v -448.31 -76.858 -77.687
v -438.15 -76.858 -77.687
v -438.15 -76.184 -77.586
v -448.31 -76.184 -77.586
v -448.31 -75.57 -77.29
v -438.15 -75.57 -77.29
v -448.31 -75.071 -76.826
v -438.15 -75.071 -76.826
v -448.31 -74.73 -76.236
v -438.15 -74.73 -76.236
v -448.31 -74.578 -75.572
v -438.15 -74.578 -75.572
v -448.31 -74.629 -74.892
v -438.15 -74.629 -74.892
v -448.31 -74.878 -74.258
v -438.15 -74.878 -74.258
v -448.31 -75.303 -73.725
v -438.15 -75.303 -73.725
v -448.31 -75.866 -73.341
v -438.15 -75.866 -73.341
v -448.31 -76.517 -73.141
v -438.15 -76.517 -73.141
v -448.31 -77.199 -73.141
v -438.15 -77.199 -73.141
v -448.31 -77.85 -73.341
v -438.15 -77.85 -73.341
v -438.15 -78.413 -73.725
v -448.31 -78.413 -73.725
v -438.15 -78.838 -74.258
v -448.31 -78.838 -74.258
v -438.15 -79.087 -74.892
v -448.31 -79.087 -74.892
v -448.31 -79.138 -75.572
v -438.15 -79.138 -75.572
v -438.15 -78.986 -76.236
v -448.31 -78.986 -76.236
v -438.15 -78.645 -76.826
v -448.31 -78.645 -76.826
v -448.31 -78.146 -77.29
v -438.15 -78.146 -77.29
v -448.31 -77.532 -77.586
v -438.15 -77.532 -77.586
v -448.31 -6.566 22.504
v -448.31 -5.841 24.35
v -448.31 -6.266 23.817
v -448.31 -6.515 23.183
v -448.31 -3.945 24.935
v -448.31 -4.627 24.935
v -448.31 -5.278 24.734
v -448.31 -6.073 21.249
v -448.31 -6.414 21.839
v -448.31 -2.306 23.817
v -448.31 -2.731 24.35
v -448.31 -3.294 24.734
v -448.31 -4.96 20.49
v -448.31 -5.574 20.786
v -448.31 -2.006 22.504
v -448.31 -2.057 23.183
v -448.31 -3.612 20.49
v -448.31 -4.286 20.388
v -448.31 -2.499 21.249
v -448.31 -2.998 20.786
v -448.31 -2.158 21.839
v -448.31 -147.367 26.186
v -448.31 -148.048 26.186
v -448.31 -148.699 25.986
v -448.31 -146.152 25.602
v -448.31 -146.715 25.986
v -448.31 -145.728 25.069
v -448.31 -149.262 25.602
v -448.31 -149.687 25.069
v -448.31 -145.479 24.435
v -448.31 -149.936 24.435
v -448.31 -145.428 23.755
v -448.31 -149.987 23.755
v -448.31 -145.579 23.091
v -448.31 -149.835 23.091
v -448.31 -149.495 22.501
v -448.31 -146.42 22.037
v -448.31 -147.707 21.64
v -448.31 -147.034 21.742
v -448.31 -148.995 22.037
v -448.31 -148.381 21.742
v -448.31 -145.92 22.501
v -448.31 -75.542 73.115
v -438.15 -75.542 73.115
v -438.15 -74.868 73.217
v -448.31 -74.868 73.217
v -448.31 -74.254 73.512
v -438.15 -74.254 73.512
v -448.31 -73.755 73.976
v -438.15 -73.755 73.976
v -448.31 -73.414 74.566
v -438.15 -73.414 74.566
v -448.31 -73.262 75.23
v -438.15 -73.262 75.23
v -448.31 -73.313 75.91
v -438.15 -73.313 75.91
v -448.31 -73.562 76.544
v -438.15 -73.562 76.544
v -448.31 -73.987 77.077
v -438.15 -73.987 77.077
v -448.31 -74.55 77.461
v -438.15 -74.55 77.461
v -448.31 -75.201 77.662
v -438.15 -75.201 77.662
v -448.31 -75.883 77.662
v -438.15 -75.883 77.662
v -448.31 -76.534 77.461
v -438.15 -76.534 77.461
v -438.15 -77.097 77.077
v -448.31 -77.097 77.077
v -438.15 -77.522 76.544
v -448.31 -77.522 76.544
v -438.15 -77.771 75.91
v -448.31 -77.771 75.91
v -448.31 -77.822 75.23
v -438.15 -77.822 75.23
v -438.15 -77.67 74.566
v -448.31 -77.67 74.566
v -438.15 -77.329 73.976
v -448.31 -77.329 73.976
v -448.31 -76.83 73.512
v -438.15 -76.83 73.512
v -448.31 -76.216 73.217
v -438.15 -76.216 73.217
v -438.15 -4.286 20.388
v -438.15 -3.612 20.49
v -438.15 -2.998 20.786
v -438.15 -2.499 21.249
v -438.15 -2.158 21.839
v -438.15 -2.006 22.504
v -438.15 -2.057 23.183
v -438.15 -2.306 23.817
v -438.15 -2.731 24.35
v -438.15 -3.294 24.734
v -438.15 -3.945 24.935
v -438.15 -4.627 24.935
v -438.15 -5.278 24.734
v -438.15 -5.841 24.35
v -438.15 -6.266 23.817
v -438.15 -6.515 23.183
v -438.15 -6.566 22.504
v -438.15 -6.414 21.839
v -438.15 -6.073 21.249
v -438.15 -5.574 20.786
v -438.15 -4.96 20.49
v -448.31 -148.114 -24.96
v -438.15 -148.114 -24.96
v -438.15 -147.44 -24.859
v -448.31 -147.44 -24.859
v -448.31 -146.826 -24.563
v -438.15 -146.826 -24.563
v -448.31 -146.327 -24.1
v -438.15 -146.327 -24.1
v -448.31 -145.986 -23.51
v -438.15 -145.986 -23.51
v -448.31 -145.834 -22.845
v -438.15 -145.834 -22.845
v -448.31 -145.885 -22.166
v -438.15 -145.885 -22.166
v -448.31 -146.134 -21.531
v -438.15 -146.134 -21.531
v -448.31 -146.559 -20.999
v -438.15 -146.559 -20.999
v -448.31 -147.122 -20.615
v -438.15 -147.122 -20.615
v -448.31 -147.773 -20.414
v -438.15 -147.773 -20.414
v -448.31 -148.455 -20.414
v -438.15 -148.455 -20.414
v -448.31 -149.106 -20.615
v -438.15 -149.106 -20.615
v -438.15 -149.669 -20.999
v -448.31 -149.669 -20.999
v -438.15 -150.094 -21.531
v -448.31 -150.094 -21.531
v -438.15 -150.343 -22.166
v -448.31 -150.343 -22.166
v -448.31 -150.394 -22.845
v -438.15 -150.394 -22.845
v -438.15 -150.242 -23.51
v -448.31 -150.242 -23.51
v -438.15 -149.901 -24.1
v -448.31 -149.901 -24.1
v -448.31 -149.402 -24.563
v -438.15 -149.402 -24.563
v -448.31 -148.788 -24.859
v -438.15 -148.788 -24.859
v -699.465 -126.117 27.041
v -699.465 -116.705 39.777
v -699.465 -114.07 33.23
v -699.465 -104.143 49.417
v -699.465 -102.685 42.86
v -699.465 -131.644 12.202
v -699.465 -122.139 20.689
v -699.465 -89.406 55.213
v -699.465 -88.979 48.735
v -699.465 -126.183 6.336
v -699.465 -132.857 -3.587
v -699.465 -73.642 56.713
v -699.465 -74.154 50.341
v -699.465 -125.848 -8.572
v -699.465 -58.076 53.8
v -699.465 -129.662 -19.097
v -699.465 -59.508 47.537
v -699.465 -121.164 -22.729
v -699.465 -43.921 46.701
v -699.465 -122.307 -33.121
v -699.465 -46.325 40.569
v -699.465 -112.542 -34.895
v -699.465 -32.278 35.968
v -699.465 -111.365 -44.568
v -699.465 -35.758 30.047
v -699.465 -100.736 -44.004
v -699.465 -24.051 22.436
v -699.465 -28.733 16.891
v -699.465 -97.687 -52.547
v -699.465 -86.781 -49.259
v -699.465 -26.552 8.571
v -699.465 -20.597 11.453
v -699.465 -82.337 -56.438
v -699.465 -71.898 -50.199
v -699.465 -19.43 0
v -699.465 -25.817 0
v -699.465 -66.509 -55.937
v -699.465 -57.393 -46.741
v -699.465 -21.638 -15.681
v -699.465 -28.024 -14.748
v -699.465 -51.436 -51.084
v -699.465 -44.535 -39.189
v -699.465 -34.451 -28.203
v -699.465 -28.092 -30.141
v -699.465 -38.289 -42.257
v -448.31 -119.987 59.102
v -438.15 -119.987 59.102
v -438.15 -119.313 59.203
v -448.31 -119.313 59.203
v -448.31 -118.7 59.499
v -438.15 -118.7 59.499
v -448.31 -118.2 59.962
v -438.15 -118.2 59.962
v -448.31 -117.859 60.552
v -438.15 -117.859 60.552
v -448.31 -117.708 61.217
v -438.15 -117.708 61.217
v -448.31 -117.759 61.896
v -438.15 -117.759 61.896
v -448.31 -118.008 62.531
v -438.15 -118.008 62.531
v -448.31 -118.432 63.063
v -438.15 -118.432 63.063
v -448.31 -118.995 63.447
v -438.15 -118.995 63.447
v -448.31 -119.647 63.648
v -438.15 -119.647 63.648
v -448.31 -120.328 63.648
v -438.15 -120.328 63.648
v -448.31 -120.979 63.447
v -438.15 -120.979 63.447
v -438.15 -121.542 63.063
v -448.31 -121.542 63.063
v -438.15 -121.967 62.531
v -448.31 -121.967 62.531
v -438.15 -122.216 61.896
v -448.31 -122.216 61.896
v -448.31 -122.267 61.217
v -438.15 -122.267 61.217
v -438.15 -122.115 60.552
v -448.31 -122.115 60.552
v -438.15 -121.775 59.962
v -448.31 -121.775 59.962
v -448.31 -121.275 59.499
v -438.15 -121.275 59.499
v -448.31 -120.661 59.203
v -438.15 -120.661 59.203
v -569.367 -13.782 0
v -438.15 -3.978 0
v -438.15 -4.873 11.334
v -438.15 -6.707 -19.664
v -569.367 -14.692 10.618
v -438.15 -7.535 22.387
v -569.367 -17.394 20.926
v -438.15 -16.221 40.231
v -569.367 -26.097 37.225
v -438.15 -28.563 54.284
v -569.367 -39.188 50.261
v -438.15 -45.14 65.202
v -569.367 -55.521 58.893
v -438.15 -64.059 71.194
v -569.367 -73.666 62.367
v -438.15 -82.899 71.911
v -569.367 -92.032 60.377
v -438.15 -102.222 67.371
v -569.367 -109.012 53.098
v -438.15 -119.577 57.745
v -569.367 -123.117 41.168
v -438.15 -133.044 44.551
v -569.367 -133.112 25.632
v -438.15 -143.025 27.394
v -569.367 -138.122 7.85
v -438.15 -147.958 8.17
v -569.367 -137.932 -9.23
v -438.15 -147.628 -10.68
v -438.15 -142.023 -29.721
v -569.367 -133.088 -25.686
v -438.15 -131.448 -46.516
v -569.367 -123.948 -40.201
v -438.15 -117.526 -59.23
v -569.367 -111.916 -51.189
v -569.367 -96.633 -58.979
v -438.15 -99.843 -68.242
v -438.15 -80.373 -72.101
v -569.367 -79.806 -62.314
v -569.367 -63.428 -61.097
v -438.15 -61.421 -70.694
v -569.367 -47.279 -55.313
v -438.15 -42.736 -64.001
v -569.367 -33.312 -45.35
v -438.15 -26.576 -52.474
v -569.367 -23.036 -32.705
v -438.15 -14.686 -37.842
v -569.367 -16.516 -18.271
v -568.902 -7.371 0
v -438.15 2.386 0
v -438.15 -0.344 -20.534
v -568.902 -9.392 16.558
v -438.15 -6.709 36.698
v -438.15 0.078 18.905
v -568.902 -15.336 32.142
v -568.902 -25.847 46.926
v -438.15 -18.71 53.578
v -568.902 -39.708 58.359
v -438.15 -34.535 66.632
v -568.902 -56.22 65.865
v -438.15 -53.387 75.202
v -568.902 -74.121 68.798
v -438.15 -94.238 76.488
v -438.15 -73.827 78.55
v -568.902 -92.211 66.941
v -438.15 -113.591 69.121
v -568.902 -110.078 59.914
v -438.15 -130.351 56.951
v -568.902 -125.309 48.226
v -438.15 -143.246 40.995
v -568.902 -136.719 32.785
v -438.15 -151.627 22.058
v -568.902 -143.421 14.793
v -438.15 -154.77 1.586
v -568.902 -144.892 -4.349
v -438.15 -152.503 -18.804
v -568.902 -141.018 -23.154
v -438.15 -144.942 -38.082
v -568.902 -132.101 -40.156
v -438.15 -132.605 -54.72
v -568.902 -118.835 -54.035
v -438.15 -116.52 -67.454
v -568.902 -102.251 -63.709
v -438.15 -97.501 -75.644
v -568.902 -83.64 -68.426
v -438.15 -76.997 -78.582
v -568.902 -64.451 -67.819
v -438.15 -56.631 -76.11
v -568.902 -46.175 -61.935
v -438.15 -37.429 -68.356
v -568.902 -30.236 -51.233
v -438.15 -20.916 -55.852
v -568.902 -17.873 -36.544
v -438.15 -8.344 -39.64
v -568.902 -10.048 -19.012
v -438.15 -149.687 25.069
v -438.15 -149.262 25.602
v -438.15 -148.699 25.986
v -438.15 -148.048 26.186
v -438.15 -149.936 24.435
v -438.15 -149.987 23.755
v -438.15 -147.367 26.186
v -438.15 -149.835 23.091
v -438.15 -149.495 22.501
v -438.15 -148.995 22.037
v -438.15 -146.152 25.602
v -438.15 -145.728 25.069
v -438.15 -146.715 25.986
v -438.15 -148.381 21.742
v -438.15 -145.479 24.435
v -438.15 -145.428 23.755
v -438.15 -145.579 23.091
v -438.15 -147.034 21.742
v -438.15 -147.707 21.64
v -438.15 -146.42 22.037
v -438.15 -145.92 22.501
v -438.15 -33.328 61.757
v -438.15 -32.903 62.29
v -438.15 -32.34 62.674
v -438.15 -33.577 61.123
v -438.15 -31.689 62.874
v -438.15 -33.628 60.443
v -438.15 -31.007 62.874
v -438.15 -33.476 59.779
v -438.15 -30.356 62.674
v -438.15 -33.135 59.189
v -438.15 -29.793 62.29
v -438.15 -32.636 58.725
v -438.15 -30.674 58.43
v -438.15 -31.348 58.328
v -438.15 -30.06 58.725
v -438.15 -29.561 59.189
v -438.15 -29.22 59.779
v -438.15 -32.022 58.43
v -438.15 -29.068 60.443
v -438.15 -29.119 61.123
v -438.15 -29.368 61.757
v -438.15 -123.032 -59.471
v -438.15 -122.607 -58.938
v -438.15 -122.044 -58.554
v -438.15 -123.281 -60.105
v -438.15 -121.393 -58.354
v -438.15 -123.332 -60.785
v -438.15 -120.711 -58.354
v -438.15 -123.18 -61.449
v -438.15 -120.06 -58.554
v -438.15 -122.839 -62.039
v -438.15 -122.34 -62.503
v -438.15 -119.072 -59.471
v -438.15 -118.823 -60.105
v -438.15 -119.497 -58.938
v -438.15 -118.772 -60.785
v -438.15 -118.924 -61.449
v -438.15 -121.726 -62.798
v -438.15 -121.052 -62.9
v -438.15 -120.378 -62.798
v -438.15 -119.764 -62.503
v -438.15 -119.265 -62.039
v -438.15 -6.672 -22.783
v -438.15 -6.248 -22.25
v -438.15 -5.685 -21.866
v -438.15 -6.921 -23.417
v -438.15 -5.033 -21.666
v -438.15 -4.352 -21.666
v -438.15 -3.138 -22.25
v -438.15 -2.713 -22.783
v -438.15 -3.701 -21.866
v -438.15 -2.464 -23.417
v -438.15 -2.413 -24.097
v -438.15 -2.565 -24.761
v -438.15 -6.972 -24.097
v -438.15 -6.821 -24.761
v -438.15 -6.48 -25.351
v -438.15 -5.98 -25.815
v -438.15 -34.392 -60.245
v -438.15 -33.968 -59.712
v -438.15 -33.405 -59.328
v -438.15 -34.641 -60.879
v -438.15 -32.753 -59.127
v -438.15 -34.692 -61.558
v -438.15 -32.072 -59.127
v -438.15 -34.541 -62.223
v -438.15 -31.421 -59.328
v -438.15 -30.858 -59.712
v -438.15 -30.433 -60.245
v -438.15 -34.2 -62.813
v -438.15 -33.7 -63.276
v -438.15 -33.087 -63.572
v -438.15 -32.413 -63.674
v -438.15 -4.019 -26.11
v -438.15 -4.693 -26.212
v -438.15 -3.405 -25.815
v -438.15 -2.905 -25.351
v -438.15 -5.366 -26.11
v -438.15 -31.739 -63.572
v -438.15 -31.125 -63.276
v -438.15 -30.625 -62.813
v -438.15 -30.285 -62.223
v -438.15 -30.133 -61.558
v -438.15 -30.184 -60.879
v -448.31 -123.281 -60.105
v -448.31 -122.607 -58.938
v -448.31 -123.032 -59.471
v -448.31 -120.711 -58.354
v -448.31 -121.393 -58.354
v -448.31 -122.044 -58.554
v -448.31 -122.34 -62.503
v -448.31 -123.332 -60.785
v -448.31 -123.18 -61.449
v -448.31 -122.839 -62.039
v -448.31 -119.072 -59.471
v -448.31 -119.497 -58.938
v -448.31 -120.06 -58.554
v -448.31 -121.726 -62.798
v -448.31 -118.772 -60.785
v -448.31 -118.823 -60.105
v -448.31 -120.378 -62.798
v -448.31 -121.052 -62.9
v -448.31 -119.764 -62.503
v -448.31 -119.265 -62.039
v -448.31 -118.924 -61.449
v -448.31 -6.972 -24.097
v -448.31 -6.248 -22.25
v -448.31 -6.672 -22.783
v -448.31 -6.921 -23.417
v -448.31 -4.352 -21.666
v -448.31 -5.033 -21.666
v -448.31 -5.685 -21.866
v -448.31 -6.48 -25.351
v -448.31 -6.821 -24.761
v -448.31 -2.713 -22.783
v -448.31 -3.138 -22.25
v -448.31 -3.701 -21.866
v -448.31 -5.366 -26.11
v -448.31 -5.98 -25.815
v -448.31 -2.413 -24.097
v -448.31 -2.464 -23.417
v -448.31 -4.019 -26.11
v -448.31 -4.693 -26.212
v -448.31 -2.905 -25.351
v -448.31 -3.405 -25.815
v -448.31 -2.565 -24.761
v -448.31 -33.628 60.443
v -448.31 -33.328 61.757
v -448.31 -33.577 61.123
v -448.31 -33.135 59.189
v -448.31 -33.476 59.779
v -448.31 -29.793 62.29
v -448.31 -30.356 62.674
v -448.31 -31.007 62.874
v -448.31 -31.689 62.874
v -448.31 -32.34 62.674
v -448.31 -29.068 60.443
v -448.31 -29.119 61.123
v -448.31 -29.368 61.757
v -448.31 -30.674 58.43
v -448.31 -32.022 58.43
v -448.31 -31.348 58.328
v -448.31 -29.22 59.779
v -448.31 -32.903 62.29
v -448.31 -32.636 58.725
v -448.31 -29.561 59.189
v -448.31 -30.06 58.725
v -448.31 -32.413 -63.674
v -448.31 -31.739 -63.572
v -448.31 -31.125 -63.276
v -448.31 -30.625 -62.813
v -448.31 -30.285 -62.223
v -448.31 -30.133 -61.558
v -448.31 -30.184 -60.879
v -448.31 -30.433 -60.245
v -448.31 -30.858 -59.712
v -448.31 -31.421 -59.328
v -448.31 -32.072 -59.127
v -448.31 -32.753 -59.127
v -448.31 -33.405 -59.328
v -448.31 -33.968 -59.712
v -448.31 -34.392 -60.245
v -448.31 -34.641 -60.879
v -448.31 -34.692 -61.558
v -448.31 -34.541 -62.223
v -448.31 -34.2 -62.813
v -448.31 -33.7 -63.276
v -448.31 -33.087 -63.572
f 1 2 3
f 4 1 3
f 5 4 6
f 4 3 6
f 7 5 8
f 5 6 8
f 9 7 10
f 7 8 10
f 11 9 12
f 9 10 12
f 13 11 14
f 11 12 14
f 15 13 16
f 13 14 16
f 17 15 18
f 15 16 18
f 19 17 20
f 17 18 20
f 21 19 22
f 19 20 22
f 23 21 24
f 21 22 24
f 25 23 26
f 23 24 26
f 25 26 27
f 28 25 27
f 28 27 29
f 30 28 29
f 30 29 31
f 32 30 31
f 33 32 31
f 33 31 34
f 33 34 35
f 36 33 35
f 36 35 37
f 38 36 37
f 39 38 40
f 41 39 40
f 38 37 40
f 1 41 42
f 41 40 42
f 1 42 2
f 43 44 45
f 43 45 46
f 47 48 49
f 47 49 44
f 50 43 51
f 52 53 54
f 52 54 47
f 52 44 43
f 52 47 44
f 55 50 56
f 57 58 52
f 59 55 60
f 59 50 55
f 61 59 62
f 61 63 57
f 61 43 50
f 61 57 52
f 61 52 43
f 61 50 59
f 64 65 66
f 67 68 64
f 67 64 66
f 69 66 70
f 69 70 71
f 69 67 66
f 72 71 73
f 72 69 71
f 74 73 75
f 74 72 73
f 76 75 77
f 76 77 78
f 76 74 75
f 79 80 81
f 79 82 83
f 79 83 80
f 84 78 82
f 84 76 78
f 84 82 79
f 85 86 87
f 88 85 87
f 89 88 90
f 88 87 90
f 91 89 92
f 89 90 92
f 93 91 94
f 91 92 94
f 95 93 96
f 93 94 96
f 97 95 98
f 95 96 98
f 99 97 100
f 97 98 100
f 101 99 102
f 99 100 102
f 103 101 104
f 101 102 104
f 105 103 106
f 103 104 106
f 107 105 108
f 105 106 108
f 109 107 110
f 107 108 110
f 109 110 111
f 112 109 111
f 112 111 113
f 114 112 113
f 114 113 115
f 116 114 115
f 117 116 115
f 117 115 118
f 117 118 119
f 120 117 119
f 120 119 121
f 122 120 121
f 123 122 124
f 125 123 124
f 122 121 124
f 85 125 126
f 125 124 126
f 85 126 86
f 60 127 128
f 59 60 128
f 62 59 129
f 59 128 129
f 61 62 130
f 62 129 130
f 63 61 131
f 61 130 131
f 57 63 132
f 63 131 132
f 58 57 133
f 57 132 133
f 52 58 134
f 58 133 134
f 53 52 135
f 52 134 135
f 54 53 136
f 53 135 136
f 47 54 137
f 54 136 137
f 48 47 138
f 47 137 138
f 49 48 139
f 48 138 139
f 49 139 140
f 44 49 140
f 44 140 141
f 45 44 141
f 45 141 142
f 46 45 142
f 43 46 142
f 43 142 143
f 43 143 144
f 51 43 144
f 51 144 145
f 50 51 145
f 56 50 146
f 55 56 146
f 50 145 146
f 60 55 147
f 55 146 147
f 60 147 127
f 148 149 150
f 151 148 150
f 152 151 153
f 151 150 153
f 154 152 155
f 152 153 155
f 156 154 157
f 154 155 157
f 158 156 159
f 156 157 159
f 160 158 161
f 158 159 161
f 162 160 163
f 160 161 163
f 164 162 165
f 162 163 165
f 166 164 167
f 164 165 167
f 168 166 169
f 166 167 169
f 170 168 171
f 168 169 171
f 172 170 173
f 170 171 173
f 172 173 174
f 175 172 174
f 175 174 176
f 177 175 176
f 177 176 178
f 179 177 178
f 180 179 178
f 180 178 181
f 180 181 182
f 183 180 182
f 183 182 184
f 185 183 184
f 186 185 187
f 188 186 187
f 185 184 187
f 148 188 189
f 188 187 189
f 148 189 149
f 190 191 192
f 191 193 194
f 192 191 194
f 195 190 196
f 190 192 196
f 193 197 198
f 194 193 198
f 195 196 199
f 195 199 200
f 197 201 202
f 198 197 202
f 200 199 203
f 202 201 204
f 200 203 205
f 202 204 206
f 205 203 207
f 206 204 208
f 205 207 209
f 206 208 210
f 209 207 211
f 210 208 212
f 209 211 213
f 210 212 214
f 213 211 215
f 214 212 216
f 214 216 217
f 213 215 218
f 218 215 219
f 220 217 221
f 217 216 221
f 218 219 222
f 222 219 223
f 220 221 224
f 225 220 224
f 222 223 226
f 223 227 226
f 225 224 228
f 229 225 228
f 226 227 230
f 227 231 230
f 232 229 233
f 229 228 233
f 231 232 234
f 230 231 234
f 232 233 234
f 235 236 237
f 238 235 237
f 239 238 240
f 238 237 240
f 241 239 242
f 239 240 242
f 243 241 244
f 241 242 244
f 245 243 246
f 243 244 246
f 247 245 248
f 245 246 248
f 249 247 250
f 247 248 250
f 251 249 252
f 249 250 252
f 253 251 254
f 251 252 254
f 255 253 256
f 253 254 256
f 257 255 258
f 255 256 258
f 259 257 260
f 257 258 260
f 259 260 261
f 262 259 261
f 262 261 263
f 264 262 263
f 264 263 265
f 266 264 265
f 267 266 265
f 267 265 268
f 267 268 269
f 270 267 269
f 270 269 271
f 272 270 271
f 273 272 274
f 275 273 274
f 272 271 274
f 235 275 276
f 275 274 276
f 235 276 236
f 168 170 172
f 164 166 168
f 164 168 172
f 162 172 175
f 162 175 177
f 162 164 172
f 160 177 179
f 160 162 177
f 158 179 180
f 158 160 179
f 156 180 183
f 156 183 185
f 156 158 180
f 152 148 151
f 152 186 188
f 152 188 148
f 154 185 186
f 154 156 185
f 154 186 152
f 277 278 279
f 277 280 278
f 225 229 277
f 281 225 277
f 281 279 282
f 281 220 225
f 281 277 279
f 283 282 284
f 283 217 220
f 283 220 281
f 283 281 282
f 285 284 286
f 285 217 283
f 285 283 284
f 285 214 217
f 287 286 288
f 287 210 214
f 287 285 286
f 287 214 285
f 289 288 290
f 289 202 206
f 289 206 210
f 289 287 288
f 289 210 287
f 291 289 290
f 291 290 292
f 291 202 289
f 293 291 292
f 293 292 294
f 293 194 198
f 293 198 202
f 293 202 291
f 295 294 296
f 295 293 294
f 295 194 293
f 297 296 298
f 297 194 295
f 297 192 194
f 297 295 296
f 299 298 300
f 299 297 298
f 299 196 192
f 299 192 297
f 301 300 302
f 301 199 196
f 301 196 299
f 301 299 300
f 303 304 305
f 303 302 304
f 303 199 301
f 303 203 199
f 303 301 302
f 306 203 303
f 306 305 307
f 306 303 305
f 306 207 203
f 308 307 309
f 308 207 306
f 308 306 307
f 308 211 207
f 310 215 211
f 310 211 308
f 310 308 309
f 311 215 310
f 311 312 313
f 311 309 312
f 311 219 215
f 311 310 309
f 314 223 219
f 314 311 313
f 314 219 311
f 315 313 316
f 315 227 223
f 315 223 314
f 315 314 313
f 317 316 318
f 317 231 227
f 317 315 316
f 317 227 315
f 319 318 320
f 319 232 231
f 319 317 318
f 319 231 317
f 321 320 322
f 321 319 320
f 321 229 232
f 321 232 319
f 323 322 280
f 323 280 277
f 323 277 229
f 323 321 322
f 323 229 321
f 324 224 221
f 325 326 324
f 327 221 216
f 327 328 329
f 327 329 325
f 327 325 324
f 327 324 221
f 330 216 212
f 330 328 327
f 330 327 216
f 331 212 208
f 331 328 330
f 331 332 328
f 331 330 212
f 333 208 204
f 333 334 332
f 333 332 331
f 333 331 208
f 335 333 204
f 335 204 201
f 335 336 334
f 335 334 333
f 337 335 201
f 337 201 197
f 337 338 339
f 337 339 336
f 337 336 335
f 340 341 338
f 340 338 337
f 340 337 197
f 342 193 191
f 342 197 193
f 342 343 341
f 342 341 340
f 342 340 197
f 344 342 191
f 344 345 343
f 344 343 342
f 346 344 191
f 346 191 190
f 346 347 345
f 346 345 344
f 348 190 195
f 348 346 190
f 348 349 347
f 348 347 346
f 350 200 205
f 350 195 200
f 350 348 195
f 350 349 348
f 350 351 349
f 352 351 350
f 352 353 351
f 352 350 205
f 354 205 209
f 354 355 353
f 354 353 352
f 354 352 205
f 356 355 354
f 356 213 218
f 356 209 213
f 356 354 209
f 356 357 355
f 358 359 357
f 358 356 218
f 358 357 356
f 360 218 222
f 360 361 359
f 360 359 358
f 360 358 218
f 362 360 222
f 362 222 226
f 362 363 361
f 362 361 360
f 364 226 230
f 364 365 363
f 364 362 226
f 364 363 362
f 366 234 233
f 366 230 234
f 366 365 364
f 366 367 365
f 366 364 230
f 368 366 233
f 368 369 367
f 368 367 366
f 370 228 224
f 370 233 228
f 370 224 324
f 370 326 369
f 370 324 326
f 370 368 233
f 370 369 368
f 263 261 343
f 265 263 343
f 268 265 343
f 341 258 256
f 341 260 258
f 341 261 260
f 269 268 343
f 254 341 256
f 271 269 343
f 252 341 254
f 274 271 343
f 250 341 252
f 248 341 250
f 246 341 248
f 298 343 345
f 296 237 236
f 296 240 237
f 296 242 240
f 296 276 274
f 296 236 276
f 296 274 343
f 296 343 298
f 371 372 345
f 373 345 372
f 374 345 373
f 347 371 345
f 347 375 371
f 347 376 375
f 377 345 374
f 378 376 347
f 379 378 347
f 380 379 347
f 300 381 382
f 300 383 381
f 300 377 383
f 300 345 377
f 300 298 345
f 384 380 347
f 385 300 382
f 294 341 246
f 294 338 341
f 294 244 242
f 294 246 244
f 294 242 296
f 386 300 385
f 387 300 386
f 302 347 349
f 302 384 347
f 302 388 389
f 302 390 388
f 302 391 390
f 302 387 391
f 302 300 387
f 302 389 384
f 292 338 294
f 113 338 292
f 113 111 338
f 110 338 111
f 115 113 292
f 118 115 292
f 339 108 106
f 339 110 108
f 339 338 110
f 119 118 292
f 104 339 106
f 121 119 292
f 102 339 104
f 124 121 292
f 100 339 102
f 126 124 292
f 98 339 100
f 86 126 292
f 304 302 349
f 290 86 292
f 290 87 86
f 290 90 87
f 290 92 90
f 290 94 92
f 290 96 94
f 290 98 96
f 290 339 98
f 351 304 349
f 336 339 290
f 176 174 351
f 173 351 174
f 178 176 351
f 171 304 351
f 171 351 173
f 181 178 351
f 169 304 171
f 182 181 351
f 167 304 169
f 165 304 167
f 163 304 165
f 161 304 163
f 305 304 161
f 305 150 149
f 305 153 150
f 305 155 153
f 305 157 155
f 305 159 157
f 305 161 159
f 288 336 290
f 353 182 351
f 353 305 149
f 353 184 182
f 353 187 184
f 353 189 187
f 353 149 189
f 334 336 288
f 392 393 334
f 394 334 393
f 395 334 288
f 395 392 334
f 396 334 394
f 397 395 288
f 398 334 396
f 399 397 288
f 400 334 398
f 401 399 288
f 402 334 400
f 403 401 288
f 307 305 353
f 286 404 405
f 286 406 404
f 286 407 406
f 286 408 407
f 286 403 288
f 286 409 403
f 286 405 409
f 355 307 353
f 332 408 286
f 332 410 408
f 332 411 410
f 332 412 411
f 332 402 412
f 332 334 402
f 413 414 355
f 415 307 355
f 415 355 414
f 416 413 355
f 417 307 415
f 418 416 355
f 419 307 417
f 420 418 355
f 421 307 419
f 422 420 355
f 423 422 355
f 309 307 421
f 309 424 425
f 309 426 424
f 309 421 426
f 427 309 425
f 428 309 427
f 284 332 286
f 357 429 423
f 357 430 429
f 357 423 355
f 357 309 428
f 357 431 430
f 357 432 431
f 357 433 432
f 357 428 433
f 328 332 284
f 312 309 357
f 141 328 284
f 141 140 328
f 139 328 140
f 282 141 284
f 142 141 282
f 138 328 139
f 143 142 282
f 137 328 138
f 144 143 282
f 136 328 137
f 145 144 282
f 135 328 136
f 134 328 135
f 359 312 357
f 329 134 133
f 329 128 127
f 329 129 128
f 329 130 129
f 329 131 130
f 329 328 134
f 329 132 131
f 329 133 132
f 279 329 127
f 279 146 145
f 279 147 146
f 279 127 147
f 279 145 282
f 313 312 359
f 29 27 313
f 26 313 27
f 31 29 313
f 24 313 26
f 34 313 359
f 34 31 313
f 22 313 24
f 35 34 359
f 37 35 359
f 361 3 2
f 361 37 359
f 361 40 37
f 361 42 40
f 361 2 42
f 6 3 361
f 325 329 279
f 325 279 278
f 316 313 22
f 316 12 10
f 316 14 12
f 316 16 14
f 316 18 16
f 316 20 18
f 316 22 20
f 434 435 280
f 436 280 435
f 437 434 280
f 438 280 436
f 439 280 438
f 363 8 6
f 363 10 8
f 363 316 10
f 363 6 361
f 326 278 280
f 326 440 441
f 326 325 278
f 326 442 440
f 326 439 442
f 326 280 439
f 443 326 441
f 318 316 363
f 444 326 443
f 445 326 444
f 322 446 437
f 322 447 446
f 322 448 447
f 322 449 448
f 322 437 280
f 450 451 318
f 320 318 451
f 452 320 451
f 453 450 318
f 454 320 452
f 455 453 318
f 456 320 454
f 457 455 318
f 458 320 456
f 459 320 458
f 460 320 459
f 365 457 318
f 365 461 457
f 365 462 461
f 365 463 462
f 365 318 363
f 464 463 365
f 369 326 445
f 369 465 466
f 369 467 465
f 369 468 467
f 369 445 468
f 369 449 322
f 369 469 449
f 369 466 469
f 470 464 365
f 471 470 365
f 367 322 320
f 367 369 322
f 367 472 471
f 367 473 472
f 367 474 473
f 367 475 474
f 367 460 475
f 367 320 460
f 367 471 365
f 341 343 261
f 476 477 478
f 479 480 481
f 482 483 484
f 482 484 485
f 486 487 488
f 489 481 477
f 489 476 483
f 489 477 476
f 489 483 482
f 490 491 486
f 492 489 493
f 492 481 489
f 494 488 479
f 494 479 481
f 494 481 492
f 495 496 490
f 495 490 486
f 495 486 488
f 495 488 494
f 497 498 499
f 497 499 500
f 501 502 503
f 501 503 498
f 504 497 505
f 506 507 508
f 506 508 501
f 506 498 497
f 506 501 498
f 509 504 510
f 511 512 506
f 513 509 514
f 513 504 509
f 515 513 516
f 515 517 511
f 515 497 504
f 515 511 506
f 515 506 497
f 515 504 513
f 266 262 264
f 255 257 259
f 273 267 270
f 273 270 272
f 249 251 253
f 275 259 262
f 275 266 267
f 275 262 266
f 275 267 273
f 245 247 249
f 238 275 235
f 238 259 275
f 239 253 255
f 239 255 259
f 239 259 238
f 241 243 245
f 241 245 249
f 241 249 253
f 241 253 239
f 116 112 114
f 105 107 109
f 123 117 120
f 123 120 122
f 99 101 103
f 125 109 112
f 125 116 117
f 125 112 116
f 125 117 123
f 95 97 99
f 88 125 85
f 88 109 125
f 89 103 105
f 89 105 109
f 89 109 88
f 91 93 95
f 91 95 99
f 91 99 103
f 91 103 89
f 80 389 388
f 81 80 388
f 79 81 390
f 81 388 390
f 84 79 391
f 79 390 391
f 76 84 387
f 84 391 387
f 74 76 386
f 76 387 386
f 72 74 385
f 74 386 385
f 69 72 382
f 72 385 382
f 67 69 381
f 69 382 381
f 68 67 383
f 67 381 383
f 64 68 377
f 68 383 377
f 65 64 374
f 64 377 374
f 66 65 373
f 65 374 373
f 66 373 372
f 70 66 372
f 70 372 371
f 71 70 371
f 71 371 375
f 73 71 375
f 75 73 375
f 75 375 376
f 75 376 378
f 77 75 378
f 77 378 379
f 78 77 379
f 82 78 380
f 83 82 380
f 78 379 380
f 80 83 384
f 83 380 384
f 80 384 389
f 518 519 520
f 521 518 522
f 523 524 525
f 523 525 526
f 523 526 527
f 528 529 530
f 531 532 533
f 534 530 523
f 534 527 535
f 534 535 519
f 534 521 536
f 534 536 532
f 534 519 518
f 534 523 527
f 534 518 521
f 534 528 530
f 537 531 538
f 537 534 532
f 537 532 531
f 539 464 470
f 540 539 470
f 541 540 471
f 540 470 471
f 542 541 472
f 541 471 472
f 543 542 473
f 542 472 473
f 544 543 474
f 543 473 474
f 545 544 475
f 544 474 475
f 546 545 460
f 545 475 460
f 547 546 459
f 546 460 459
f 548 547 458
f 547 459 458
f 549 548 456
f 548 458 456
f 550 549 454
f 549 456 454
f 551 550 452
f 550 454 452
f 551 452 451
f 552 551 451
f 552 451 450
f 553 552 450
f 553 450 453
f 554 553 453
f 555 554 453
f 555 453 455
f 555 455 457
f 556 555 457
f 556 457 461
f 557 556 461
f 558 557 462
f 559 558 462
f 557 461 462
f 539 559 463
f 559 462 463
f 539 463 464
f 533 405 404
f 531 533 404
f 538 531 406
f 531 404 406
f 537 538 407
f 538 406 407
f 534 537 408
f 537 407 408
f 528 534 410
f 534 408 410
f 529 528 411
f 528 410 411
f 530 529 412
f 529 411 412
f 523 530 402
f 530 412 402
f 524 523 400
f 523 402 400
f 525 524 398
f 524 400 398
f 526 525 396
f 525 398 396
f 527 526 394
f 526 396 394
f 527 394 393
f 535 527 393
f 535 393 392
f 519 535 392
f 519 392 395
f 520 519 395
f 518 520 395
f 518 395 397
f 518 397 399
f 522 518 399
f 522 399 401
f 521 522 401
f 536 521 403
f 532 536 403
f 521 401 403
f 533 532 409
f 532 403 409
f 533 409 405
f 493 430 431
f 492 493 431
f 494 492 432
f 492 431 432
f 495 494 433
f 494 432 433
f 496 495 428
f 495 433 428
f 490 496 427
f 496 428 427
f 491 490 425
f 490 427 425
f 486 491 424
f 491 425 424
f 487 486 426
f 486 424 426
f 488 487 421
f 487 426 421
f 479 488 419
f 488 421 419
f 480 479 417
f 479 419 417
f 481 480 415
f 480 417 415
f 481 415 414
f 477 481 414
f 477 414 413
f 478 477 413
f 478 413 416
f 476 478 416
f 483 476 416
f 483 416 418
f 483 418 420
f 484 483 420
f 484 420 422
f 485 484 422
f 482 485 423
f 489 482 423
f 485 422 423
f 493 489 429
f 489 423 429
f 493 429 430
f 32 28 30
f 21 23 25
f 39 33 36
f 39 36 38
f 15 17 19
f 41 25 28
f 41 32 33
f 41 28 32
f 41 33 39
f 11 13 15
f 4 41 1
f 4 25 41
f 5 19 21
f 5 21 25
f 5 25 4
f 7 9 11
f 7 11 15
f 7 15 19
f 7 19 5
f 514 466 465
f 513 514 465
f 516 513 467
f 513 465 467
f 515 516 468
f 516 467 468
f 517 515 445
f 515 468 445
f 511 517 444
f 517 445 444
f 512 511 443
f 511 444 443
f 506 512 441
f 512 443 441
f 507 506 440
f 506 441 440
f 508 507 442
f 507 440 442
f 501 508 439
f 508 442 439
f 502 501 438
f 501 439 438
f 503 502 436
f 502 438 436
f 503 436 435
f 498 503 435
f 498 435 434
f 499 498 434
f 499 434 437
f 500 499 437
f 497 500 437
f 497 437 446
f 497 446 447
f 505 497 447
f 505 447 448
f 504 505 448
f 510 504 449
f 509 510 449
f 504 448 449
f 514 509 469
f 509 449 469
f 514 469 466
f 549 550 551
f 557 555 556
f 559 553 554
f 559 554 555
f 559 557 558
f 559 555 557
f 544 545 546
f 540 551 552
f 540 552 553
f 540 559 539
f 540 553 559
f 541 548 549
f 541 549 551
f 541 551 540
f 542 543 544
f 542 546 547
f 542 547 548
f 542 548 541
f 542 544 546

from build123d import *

# Parameters (mm, degrees)
SKETCH8_R          = 142.345864783
CUT_EXTRUDE4_DEPTH = 524.976683945
SKETCH9_R          = 2.286
CUT_EXTRUDE5_DEPTH = 10.16
SKETCH10_R         = 97.880426188
CUT_EXTRUDE6_DEPTH = 228.6


with BuildPart() as part:
    # Sketch1 → Revolve1 (revolve)
    with BuildSketch(Plane.XY):
        with BuildLine():
            Line((6.35, 11.460570284), (-259.812483715, 11.460570284))
            add(Edge.make_bspline(
                [(-259.812483715, 11.460570284), (-287.31210638, 10.562340852), (-342.298022137, 8.171569009), (-452.140135716, 1.833524736), (-589.280273052, -8.512118808), (-726.176632388, -21.770900754), (-835.465785428, -34.58872614), (-890.027026607, -41.965202762), (-917.245364413, -46.039623622)],
                knots=[0.121539178, 0.121539178, 0.121539178, 0.121539178, 0.200323508, 0.279107838, 0.436676499, 0.594245159, 0.67302949, 0.75181382, 0.75181382, 0.75181382, 0.75181382], degree=3))
            ThreePointArc((-917.245364413, -46.039623622), (-924.987260279, -50.310773033), (-928.0652, -58.599678629))
            Line((-928.0652, -58.599678629), (-921.7152, -58.599678629))
            ThreePointArc((-921.7152, -58.599678629), (-920.17623014, -54.455225831), (-916.305282206, -52.319651125))
            add(Edge.make_bspline(
                [(-259.605182082, 5.113954963), (-267.127682546, 4.868244998), (-283.42603151, 4.285669281), (-317.270262329, 2.880505646), (-361.130016616, 0.711244662), (-431.275457269, -3.371956494), (-501.372917975, -8.266876273), (-571.414486843, -13.891682648), (-623.914744737, -18.477698889), (-676.380314027, -23.439349795), (-728.80566324, -28.799062072), (-772.453634614, -33.627485173), (-807.34181653, -37.739154543), (-833.490683911, -40.958900147), (-859.619375692, -44.328941115), (-885.723877265, -47.869335132), (-904.612492975, -50.577906922), (-914.800968172, -52.094464395), (-916.305282206, -52.319651125)],
                knots=[0.121539178, 0.121539178, 0.121539178, 0.121539178, 0.143122913, 0.168303261, 0.218663957, 0.269024652, 0.369746043, 0.420106738, 0.470467434, 0.520828129, 0.571188825, 0.62154952, 0.646729868, 0.671910216, 0.697090564, 0.722270911, 0.747451259, 0.75181382, 0.75181382, 0.75181382, 0.75181382], degree=3))
            ThreePointArc((-259.605182082, 5.113954963), (-256.399753184, 4.364993874), (-254, 2.11179575))
            ThreePointArc((-254, 2.11179575), (-251.60858665, -0.136927523), (-248.413737762, -0.890953221))
            add(Edge.make_bspline(
                [(0, 0), (-50.8, 0), (-101.6, 0), (-157.182375328, 0), (-166.747125983, 0), (-181.094251966, 0), (-190.659002621, 0), (-199.585120865, 0), (-207.872606698, 0), (-220.304800851, -0.154959839), (-228.589711976, -0.361524821), (-235.094659099, -0.523710542), (-239.819642219, -0.641517002), (-245.046645359, -0.791480258), (-247.911294959, -0.876040976), (-248.413737762, -0.890953221)],
                knots=[0.761574077, 0.761574077, 0.761574077, 0.761574077, 0.907841521, 0.907841521, 0.921611321, 0.935381121, 0.94915092, 0.94915092, 0.961081918, 0.973012916, 0.984943914, 0.984943914, 0.991748303, 0.998552693, 1, 1, 1, 1], degree=3))
            Line((0, 0), (6.35, 0))
            Line((6.35, 0), (6.35, 11.460570284))
        make_face()
    revolve(axis=Axis((0, -76.2, 0), (-1, 0, 0)))

    # Sketch8 → Cut-Extrude4 (cut, through all)
    with BuildSketch(Plane(origin=(-438.15, 0, 0), x_dir=(0, 0, -1), z_dir=(1, 0, 0))):
        with Locations((0, -76.2)):
            Circle(SKETCH8_R)
    extrude(amount=CUT_EXTRUDE4_DEPTH, mode=Mode.SUBTRACT)

    # Sketch9 → Cut-Extrude5 (cut)
    with BuildSketch(Plane(origin=(-438.15, 0, 0), x_dir=(0, 0, -1), z_dir=(1, 0, 0))):
        with Locations((23.926020811, -4.692661383)):
            Circle(SKETCH9_R)
        with Locations((61.387516514, -32.412710015)):
            Circle(SKETCH9_R)
        with Locations((75.401067393, -76.858015146)):
            Circle(SKETCH9_R)
        with Locations((60.613973316, -121.051980857)):
            Circle(SKETCH9_R)
        with Locations((22.674401626, -148.114014343)):
            Circle(SKETCH9_R)
        with Locations((-23.926020811, -147.707338617)):
            Circle(SKETCH9_R)
        with Locations((-61.387516514, -119.987289985)):
            Circle(SKETCH9_R)
        with Locations((-75.401067393, -75.541984854)):
            Circle(SKETCH9_R)
        with Locations((-60.613973316, -31.348019143)):
            Circle(SKETCH9_R)
        with Locations((-22.674401626, -4.285985657)):
            Circle(SKETCH9_R)
    extrude(amount=-CUT_EXTRUDE5_DEPTH, mode=Mode.SUBTRACT)

    # Sketch10 → Cut-Extrude6 (cut)
    with BuildSketch(Plane(origin=(-928.0652, 0, 0), x_dir=(0, 0, -1), z_dir=(1, 0, 0))):
        with Locations((0, -76.2)):
            Circle(SKETCH10_R)
    extrude(amount=CUT_EXTRUDE6_DEPTH, mode=Mode.SUBTRACT)


solid = part.part
